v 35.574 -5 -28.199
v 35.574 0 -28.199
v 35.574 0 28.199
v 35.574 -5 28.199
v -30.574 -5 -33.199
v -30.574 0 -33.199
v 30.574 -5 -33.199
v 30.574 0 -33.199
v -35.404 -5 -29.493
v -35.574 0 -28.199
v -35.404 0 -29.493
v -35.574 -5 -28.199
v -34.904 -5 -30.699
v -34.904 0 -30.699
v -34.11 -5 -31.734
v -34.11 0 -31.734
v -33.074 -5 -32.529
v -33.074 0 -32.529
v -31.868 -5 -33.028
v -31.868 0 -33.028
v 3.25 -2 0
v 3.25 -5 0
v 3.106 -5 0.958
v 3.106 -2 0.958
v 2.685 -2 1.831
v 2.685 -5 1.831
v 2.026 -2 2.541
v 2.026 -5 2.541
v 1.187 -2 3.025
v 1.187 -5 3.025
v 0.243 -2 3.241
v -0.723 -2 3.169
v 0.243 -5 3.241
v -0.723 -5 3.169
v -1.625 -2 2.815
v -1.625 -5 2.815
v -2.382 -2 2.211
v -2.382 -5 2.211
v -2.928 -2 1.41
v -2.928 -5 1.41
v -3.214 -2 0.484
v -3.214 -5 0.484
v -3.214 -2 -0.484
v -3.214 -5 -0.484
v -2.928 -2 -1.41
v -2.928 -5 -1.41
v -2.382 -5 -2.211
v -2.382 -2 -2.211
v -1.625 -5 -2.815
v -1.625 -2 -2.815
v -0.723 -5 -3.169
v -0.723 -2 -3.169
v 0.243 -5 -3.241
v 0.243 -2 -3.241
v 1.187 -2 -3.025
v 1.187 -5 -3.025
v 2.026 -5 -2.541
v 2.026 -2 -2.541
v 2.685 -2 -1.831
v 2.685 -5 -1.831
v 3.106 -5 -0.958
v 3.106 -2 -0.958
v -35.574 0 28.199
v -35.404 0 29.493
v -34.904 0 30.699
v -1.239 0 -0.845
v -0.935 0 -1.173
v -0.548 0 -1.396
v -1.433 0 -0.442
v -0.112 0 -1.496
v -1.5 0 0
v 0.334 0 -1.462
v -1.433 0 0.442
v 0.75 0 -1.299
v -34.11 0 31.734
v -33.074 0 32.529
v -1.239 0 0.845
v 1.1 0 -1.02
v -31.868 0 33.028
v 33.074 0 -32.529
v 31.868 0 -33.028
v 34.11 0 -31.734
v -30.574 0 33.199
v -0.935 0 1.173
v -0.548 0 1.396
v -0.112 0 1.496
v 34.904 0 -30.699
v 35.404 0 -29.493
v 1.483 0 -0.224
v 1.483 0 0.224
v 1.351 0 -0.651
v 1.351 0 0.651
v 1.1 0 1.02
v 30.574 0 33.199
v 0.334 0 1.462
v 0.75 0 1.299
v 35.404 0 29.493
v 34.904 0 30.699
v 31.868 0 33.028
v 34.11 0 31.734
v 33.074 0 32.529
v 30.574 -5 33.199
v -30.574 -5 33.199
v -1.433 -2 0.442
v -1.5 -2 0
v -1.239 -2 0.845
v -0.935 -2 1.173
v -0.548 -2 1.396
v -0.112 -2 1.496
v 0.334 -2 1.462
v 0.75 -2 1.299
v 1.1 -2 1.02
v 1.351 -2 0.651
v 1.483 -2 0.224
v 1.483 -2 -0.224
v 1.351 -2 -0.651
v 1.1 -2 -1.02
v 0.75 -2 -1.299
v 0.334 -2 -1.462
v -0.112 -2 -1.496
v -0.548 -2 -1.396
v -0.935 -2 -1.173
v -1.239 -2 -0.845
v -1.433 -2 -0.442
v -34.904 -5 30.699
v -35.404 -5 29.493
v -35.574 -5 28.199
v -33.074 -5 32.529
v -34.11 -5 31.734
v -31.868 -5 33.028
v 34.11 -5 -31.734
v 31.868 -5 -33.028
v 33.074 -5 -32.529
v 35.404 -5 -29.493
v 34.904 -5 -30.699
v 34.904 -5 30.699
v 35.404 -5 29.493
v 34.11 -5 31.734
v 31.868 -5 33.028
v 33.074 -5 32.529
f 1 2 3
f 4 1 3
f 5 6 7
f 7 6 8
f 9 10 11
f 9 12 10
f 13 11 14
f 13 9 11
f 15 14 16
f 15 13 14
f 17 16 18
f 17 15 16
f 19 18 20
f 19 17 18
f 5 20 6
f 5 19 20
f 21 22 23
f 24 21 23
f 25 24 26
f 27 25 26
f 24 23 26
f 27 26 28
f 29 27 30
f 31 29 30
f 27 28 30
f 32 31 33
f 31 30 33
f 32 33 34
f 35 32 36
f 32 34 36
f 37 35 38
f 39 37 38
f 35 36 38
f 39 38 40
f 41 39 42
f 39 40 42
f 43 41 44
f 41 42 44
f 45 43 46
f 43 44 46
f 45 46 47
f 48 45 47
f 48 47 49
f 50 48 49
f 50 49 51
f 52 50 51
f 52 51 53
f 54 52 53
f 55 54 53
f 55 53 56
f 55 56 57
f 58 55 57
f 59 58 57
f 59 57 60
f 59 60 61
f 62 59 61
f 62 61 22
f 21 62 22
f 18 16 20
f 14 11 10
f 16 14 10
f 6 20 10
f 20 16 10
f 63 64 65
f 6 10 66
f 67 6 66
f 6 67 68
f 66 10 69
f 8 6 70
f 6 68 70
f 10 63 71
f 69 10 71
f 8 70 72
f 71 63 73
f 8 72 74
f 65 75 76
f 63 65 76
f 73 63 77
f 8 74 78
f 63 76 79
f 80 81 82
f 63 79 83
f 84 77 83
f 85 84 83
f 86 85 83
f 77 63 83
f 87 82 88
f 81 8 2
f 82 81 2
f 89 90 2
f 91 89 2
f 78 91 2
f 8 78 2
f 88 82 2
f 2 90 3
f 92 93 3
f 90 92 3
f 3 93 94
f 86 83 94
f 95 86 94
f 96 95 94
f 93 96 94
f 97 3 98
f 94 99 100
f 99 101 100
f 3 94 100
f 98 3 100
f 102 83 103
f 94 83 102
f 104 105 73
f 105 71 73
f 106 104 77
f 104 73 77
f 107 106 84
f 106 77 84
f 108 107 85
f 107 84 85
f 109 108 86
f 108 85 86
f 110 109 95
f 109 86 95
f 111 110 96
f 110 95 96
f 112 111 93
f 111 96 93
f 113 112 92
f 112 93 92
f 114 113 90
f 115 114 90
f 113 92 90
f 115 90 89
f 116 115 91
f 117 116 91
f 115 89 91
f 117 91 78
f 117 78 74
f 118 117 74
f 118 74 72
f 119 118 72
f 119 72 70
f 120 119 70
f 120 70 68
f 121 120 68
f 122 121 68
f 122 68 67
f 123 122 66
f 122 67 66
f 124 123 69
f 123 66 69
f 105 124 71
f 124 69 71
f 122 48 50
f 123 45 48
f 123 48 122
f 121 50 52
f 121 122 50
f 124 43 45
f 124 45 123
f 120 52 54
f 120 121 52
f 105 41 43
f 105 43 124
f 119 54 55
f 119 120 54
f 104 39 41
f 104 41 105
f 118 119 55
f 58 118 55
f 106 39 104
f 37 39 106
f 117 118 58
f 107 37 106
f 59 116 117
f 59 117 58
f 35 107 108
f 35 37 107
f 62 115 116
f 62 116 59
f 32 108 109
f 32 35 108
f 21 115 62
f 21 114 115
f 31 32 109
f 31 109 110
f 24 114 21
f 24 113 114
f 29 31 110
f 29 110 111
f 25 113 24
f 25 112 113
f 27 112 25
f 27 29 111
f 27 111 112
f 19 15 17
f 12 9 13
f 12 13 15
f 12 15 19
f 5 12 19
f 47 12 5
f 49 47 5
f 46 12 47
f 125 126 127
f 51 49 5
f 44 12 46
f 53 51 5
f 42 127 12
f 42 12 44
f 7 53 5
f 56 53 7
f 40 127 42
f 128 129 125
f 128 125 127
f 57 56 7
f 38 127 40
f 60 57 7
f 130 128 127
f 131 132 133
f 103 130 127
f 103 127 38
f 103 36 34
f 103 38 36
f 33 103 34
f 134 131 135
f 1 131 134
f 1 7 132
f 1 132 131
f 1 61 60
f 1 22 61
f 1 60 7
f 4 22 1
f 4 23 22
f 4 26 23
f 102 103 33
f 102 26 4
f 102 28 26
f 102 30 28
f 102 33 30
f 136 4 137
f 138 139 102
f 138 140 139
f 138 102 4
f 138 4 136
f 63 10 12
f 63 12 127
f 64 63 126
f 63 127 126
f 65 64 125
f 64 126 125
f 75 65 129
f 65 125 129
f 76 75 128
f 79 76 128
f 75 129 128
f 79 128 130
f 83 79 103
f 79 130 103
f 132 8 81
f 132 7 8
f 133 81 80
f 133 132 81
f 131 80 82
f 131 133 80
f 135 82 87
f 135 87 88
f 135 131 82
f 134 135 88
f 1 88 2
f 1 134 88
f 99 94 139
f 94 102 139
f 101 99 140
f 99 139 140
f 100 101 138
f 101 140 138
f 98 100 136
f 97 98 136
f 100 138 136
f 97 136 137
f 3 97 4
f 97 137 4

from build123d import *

# Parameters (mm, degrees)
F0_W           = 71.148194
F0_H           = 66.397064
F1_DEPTH       = 5
F3_D           = 3
F3_CBORE_D     = 6.5
F3_CBORE_DEPTH = 3
F4_R           = 5


with BuildPart() as f1:
    # F0 (on Front) → F1 (new body)
    with BuildSketch(Plane.XZ):
        Rectangle(F0_W, F0_H)
    extrude(amount=F1_DEPTH)

    # F3 (through all)
    with Locations(Plane.XZ.offset(5)):
        with Locations((0, 0)):
            CounterBoreHole(F3_D / 2, F3_CBORE_D / 2, F3_CBORE_DEPTH)

    # F4
    f4_edges = [f1.edges().sort_by_distance(p)[0] for p in [
        (35.574097, -2.5, 33.198532),
        (-35.574097, -2.5, 33.198532),
        (35.574097, -2.5, -33.198532),
        (-35.574097, -2.5, -33.198532),
    ]]
    fillet(f4_edges, radius=F4_R)


solid = f1.part
